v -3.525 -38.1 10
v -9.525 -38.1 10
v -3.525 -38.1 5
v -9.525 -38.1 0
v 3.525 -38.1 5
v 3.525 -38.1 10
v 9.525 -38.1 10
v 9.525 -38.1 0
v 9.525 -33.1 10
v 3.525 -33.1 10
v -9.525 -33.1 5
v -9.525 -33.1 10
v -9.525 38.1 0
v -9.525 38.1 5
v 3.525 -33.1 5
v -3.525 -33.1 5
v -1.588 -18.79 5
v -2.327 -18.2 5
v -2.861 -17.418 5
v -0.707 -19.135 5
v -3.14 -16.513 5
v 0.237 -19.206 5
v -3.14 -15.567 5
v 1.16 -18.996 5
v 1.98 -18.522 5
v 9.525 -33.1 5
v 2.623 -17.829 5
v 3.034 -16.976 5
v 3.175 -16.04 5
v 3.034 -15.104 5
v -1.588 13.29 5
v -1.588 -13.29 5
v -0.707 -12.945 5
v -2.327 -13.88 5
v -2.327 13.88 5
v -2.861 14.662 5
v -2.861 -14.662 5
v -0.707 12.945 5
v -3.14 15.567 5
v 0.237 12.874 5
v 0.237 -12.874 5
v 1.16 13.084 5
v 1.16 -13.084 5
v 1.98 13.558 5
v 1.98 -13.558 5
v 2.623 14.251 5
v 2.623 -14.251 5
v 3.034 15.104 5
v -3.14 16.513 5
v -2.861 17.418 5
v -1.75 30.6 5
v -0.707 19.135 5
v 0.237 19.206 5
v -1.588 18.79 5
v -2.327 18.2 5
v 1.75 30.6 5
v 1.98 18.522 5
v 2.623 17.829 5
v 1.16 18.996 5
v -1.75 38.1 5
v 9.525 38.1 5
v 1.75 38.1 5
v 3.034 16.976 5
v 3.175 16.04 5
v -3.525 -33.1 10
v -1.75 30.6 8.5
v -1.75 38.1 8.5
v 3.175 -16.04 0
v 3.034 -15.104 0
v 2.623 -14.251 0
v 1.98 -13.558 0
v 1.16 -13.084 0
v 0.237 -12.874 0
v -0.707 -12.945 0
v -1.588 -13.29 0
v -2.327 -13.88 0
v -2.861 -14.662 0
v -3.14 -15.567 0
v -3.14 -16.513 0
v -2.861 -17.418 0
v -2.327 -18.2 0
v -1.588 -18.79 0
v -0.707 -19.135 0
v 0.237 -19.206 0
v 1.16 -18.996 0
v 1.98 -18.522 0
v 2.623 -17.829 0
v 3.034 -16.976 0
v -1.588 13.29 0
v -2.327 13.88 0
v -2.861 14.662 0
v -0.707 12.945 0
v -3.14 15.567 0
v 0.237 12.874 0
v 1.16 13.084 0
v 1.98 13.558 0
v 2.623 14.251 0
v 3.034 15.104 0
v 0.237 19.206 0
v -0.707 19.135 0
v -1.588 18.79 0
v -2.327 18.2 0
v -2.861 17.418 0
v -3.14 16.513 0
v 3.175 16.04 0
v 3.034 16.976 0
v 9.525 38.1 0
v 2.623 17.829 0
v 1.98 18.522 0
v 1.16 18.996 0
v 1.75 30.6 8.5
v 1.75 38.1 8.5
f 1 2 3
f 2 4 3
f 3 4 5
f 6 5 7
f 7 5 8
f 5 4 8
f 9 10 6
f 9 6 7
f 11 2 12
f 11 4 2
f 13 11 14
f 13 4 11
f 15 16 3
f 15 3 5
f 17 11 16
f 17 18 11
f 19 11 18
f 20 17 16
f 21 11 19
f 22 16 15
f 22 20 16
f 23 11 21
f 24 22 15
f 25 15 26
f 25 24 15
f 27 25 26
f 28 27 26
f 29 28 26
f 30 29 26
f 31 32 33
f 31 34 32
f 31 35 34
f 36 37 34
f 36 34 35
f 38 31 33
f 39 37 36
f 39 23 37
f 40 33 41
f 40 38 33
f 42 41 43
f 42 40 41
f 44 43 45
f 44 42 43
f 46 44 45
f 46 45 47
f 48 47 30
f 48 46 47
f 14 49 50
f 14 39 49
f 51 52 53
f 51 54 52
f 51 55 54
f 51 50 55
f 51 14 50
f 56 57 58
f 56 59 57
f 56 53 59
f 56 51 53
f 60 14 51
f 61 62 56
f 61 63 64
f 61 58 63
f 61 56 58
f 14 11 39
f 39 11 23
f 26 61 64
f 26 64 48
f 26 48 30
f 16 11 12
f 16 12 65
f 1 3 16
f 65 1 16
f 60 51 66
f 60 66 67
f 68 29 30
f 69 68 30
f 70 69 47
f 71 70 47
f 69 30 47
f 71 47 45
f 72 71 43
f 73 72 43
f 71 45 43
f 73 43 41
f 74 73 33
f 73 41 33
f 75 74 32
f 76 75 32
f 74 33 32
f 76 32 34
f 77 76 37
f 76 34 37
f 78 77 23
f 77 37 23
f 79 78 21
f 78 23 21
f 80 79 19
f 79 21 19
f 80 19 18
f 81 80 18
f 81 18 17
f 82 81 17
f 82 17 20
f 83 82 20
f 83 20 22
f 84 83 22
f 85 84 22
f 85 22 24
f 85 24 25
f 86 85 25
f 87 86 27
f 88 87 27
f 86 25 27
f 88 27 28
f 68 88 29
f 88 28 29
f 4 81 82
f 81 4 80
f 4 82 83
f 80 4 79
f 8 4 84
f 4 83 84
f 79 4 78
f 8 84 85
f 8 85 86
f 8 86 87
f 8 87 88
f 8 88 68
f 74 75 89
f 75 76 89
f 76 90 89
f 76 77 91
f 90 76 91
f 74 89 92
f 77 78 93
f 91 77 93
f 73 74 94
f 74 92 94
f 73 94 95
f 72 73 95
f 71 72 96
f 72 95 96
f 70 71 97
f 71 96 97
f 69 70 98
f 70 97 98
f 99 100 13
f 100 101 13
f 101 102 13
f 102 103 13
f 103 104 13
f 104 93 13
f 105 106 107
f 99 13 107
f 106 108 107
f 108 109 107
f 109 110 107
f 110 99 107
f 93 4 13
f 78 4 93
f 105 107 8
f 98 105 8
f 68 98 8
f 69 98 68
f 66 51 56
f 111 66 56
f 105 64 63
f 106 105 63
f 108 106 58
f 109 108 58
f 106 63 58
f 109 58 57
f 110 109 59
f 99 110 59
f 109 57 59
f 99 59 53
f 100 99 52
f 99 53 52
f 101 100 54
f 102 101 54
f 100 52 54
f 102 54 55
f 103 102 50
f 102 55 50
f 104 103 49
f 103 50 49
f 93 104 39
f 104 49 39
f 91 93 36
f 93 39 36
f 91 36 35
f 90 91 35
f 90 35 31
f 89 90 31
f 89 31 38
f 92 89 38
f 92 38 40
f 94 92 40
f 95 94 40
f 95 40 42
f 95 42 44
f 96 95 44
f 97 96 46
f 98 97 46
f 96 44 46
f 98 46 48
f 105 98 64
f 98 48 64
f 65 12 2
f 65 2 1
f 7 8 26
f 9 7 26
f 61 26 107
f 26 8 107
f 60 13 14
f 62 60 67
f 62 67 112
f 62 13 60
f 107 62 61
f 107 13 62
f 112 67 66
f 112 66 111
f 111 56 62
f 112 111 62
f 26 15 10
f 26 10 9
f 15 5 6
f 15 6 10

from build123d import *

# Parameters (mm, degrees)
F0_W      = 19.05
F0_H      = 76.2
F1_DEPTH  = 5
F2_W      = 3.5
F2_H      = 7.5
F2_W_2    = 6
F2_H_2    = 5
F3_DEPTH  = 5
F4_R      = 3.175
F5_DEPTH  = 5
F3_FACE_W = 3.5
F3_FACE_H = 7.5
F6_DEPTH  = 1.5


with BuildPart() as f1:
    # F0 (on Top) → F1 (new body)
    with BuildSketch(Plane.XY):
        Rectangle(F0_W, F0_H)
    extrude(amount=F1_DEPTH)

    # F2 (on face) → F3 (join)
    with BuildSketch(Plane.XY.offset(5)):
        with Locations((0, 34.35)):
            Rectangle(F2_W, F2_H)
        with Locations((-6.525, -35.6)):
            Rectangle(F2_W_2, F2_H_2)
        with Locations((6.525, -35.6)):
            Rectangle(F2_W_2, F2_H_2)
    extrude(amount=F3_DEPTH)

    # F4 (on face) → F5 (cut)
    with BuildSketch(Plane.XY.offset(5)):
        with Locations((0, 16.04)):
            Circle(F4_R)
        with Locations((0, -16.04)):
            Circle(F4_R)
    extrude(amount=-F5_DEPTH, mode=Mode.SUBTRACT)

    # F3_face (on face) → F6 (cut)
    with BuildSketch(Plane(origin=(0, 34.35, 10), x_dir=(1, 0, 0), z_dir=(0, 0, 1))):
        Rectangle(F3_FACE_W, F3_FACE_H)
    extrude(amount=-F6_DEPTH, mode=Mode.SUBTRACT)


solid = f1.part
